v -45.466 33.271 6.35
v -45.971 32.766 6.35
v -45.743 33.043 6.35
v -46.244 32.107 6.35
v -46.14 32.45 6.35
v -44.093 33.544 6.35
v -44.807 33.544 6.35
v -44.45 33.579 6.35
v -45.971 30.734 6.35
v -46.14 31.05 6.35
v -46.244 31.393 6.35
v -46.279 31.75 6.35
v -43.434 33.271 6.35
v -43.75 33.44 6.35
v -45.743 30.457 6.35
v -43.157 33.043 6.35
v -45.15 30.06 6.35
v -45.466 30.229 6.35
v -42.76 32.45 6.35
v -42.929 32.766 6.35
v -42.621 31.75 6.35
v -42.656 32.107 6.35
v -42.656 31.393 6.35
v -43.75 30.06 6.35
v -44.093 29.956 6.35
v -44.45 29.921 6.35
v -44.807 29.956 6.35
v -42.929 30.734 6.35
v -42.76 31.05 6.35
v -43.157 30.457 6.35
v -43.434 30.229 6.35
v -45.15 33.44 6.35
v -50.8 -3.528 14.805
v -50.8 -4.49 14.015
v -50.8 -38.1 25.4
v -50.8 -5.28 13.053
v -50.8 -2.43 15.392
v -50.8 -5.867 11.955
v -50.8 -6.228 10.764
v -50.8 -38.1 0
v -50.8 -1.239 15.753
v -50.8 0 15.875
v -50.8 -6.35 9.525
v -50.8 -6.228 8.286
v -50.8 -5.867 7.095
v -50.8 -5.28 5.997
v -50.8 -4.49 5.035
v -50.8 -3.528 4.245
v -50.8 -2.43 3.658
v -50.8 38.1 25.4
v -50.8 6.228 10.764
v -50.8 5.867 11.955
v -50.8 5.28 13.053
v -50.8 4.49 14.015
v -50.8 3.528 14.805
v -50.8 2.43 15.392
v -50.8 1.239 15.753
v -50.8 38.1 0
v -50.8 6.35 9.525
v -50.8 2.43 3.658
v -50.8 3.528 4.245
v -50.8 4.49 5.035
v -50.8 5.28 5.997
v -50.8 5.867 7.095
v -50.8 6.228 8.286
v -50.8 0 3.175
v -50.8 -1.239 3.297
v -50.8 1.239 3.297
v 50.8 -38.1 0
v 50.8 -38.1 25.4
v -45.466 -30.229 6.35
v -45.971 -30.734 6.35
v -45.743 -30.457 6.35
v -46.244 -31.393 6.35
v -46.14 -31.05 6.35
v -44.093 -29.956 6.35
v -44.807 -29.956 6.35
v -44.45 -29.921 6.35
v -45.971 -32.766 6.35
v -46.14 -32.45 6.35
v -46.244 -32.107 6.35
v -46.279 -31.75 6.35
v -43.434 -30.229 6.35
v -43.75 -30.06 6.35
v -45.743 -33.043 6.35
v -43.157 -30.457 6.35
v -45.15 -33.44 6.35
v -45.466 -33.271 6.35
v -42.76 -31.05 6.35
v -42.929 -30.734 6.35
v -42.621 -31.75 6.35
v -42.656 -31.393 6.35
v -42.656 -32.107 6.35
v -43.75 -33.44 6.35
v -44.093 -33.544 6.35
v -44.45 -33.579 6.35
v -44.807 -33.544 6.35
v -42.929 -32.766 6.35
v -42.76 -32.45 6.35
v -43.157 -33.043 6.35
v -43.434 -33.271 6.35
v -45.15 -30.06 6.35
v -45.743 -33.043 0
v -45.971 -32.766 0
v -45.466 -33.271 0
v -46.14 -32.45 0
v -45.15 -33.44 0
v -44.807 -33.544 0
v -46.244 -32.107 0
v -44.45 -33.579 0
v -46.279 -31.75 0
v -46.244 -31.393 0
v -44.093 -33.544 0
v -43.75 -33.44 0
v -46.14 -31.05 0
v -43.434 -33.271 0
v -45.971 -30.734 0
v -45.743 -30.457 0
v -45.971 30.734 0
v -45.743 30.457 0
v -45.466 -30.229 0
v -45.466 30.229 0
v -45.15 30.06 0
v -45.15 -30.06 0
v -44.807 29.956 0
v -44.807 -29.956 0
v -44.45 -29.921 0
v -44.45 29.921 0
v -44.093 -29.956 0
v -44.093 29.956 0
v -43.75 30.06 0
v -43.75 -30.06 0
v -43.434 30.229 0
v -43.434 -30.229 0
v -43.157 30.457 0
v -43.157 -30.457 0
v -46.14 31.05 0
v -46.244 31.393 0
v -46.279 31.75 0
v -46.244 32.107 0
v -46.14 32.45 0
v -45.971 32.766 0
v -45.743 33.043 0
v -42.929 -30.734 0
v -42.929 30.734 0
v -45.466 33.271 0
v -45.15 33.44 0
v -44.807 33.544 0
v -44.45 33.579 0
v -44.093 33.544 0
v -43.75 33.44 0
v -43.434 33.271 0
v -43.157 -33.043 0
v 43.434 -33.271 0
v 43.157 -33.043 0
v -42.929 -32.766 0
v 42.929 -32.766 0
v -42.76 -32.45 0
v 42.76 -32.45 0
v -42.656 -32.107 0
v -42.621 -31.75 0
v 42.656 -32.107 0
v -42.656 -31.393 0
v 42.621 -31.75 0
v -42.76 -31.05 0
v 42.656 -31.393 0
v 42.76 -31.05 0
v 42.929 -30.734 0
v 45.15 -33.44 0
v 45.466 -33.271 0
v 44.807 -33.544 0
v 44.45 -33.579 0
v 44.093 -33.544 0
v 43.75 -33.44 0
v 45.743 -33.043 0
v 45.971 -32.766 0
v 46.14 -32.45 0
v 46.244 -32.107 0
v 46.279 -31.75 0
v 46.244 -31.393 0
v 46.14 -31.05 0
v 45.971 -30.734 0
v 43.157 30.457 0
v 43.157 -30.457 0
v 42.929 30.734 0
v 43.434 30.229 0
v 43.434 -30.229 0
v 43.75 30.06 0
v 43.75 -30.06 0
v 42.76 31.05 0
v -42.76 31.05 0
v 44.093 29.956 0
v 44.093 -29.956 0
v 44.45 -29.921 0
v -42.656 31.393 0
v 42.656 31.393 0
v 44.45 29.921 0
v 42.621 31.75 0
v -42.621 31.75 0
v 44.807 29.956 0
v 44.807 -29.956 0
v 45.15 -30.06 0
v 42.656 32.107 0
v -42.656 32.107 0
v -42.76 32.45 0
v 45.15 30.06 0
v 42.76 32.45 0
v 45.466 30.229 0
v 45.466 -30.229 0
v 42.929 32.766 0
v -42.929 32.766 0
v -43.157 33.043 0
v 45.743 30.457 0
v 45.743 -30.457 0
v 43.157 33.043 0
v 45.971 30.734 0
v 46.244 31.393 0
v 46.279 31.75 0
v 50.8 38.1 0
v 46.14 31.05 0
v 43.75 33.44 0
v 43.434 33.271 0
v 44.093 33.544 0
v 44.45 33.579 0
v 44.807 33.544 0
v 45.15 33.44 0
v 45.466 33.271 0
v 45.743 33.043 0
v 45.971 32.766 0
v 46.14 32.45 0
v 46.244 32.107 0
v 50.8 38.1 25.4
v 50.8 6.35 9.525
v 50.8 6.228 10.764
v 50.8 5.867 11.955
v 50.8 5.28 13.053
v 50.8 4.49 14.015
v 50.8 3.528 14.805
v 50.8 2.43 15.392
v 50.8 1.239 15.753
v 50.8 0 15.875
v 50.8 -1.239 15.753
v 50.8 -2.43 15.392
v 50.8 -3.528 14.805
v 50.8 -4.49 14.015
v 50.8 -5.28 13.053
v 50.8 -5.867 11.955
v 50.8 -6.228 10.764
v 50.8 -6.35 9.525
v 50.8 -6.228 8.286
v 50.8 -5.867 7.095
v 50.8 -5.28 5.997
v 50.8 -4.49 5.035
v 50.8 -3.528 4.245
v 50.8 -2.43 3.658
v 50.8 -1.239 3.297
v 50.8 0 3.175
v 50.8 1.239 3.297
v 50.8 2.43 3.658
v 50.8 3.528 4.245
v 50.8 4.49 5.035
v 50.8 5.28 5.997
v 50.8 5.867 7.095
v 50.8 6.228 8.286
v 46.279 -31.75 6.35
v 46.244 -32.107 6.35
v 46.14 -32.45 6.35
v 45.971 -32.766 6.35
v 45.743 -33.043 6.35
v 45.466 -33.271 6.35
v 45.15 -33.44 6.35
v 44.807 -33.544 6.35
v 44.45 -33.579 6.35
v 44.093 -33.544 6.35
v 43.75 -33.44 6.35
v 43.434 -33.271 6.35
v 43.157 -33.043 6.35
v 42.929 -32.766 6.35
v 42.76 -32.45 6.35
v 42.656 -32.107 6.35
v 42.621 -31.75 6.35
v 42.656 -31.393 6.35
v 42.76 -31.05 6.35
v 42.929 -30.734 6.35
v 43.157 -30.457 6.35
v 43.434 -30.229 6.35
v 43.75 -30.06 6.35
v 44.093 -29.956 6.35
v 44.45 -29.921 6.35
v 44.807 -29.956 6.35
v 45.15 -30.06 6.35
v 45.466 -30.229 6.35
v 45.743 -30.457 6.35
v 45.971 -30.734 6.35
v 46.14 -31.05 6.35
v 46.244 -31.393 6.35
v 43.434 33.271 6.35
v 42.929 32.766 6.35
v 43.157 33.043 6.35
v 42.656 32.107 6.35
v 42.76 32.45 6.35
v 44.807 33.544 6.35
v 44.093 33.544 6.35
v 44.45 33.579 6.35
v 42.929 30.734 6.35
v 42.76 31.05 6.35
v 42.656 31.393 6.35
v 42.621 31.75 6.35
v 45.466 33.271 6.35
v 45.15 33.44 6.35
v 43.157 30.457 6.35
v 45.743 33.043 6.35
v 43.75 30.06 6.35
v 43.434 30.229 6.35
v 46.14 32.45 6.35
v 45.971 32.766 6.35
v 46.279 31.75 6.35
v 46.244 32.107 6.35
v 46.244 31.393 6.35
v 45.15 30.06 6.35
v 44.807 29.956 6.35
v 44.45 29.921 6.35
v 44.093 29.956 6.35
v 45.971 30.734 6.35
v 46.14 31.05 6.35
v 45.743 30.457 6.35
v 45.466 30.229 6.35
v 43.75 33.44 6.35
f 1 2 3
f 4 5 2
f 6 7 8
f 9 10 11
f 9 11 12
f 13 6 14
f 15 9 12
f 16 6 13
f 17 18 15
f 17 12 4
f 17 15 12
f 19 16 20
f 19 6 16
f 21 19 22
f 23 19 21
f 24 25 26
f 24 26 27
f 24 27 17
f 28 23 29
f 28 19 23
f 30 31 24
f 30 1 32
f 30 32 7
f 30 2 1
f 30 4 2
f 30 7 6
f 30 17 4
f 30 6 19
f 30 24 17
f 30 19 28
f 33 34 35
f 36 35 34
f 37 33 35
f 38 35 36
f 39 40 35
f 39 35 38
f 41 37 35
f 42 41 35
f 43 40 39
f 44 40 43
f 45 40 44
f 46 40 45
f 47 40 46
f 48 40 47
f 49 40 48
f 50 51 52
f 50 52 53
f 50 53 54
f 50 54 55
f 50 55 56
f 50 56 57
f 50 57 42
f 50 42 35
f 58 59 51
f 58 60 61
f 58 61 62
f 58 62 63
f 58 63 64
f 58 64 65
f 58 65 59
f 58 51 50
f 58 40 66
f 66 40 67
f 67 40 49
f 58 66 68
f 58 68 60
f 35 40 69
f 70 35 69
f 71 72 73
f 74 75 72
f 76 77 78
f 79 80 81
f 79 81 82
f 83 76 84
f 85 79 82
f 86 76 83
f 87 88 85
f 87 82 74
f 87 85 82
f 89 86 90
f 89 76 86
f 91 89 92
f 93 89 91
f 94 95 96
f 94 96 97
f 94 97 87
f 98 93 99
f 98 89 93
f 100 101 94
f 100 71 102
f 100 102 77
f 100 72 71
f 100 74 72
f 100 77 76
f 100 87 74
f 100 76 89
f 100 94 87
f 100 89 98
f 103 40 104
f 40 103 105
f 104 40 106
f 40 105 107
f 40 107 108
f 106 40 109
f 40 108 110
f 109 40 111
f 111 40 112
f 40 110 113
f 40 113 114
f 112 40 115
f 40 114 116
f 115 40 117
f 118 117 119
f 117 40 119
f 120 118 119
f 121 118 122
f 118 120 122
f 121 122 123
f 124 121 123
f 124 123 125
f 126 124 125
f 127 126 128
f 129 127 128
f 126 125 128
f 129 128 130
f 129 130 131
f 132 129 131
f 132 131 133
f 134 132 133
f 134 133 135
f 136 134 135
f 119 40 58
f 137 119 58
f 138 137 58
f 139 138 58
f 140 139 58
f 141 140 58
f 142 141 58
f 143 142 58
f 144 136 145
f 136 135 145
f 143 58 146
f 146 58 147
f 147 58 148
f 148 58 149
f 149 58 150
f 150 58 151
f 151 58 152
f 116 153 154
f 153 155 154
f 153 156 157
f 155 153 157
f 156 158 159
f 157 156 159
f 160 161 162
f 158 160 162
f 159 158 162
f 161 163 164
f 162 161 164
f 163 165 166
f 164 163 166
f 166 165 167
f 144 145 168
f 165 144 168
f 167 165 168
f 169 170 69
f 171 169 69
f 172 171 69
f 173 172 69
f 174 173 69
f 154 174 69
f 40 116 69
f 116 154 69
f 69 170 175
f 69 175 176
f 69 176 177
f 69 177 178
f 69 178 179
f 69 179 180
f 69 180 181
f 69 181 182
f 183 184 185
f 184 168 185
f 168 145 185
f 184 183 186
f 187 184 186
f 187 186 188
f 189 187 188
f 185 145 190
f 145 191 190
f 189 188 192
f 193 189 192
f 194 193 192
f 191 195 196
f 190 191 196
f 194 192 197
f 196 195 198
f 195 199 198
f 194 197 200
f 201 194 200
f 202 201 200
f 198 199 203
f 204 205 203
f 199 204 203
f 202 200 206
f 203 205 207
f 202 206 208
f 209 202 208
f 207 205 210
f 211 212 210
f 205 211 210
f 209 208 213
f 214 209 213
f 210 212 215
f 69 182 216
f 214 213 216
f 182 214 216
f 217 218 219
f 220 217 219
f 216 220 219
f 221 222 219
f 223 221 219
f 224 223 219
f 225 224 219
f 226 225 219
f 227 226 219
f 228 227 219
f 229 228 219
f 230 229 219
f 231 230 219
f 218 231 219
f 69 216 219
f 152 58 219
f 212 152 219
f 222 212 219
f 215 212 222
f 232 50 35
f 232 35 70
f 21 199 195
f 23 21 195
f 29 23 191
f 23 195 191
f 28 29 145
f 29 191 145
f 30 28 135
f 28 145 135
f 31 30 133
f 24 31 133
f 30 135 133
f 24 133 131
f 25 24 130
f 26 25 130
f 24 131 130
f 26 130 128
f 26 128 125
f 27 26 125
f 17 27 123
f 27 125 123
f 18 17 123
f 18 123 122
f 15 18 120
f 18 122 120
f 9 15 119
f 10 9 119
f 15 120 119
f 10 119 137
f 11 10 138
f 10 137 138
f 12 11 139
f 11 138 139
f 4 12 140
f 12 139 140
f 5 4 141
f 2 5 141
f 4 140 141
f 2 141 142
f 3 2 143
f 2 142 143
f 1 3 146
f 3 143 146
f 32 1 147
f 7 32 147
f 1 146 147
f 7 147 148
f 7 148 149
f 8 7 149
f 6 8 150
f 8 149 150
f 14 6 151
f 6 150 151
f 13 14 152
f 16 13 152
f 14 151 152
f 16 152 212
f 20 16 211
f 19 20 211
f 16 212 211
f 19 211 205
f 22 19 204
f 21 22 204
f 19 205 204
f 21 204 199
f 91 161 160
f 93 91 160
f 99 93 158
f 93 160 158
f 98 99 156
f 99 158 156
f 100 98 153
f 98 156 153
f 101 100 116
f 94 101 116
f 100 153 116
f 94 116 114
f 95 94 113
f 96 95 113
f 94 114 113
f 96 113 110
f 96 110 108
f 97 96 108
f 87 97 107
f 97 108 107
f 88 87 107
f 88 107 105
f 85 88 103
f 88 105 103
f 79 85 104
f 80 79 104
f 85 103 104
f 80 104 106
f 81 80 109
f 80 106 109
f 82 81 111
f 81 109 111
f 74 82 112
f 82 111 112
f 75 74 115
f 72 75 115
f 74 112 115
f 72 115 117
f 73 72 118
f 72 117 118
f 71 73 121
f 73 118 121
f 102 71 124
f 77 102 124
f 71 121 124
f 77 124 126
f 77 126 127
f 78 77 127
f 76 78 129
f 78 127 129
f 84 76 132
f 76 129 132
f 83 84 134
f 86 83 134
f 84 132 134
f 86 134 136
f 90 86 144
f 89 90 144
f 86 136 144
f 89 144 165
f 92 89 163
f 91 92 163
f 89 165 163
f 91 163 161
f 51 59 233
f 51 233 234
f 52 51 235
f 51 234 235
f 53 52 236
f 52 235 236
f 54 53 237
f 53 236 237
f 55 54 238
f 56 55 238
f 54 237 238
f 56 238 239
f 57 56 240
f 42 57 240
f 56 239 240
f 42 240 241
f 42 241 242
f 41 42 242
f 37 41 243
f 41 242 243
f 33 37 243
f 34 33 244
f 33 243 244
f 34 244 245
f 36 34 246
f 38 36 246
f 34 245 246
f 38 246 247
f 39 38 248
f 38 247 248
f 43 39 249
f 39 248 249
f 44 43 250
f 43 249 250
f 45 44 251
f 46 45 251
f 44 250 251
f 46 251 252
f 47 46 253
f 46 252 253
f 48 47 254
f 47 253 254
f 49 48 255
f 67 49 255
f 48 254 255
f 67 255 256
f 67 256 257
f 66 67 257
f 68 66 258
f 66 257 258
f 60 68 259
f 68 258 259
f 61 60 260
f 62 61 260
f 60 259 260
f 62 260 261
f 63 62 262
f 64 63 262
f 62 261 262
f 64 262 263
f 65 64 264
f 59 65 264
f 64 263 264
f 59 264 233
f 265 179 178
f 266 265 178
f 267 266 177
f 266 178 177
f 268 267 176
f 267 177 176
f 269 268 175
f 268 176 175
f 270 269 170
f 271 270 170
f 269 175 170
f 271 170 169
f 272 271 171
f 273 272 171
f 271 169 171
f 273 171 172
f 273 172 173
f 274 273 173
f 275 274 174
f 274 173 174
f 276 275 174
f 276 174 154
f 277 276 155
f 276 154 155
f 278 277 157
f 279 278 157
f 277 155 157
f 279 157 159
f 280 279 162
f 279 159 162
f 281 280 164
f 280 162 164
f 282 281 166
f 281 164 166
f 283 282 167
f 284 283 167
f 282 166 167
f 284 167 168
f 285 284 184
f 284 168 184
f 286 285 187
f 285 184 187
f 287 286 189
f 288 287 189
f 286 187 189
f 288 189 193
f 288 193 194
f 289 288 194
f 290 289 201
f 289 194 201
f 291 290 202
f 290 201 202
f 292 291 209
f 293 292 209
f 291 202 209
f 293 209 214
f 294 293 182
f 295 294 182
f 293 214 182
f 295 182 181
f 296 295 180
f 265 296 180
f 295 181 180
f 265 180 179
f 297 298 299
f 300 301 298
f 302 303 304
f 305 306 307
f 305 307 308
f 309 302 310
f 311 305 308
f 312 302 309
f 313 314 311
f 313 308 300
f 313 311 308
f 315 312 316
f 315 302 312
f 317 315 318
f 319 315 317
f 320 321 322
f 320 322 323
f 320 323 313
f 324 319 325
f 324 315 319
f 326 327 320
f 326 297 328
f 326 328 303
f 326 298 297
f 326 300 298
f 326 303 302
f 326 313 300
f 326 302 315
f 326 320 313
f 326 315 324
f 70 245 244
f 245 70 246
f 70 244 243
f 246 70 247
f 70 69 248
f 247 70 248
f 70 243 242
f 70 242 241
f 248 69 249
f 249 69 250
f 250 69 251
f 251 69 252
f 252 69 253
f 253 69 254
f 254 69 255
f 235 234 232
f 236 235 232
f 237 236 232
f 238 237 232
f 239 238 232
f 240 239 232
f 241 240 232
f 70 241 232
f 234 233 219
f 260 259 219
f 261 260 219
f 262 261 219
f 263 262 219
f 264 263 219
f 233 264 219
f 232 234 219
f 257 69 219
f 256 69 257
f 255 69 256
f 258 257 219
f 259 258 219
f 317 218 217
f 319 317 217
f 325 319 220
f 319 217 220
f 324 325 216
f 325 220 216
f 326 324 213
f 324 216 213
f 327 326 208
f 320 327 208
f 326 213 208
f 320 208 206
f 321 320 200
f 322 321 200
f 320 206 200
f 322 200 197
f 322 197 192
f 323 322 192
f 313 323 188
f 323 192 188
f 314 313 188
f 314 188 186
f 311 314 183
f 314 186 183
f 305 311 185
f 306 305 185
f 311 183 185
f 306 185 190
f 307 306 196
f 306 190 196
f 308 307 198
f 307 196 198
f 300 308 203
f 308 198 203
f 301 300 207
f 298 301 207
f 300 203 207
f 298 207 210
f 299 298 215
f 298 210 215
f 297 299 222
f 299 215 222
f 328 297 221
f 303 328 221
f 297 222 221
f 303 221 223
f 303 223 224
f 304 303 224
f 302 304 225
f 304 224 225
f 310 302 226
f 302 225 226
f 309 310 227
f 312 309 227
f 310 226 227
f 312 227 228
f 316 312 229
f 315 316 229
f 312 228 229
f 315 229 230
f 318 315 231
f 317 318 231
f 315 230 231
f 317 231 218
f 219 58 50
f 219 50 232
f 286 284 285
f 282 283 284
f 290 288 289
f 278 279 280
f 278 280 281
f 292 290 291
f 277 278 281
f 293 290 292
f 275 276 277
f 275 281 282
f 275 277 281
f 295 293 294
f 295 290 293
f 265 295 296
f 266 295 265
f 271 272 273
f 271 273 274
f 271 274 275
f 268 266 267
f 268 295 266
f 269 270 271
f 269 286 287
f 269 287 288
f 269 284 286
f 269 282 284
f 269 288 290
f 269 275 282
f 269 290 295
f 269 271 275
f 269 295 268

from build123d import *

# Parameters (mm, degrees)
F0_W     = 101.6
F0_H     = 76.2
F1_DEPTH = 25.4
F2_R     = 6.35
F3_DEPTH = 101.6
F4_R     = 1.8288
F5_DEPTH = 6.35


with BuildPart() as f1:
    # F0 (on Top) → F1 (new body)
    with BuildSketch(Plane.XY):
        Rectangle(F0_W, F0_H)
    extrude(amount=F1_DEPTH)

    # F2 (on face) → F3 (cut)
    with BuildSketch(Plane.YZ.offset(50.8)):
        with Locations((0, 9.525)):
            Circle(F2_R)
    extrude(amount=-F3_DEPTH, mode=Mode.SUBTRACT)

    # F4 (on face) → F5 (cut)
    with BuildSketch(Plane(origin=(0, 0, 0), x_dir=(1, 0, 0), z_dir=(0, 0, -1))):
        with Locations((-44.45, 31.75)):
            Circle(F4_R)
        with Locations((-44.45, -31.75)):
            Circle(F4_R)
        with Locations((44.45, -31.75)):
            Circle(F4_R)
        with Locations((44.45, 31.75)):
            Circle(F4_R)
    extrude(amount=-F5_DEPTH, mode=Mode.SUBTRACT)


solid = f1.part
